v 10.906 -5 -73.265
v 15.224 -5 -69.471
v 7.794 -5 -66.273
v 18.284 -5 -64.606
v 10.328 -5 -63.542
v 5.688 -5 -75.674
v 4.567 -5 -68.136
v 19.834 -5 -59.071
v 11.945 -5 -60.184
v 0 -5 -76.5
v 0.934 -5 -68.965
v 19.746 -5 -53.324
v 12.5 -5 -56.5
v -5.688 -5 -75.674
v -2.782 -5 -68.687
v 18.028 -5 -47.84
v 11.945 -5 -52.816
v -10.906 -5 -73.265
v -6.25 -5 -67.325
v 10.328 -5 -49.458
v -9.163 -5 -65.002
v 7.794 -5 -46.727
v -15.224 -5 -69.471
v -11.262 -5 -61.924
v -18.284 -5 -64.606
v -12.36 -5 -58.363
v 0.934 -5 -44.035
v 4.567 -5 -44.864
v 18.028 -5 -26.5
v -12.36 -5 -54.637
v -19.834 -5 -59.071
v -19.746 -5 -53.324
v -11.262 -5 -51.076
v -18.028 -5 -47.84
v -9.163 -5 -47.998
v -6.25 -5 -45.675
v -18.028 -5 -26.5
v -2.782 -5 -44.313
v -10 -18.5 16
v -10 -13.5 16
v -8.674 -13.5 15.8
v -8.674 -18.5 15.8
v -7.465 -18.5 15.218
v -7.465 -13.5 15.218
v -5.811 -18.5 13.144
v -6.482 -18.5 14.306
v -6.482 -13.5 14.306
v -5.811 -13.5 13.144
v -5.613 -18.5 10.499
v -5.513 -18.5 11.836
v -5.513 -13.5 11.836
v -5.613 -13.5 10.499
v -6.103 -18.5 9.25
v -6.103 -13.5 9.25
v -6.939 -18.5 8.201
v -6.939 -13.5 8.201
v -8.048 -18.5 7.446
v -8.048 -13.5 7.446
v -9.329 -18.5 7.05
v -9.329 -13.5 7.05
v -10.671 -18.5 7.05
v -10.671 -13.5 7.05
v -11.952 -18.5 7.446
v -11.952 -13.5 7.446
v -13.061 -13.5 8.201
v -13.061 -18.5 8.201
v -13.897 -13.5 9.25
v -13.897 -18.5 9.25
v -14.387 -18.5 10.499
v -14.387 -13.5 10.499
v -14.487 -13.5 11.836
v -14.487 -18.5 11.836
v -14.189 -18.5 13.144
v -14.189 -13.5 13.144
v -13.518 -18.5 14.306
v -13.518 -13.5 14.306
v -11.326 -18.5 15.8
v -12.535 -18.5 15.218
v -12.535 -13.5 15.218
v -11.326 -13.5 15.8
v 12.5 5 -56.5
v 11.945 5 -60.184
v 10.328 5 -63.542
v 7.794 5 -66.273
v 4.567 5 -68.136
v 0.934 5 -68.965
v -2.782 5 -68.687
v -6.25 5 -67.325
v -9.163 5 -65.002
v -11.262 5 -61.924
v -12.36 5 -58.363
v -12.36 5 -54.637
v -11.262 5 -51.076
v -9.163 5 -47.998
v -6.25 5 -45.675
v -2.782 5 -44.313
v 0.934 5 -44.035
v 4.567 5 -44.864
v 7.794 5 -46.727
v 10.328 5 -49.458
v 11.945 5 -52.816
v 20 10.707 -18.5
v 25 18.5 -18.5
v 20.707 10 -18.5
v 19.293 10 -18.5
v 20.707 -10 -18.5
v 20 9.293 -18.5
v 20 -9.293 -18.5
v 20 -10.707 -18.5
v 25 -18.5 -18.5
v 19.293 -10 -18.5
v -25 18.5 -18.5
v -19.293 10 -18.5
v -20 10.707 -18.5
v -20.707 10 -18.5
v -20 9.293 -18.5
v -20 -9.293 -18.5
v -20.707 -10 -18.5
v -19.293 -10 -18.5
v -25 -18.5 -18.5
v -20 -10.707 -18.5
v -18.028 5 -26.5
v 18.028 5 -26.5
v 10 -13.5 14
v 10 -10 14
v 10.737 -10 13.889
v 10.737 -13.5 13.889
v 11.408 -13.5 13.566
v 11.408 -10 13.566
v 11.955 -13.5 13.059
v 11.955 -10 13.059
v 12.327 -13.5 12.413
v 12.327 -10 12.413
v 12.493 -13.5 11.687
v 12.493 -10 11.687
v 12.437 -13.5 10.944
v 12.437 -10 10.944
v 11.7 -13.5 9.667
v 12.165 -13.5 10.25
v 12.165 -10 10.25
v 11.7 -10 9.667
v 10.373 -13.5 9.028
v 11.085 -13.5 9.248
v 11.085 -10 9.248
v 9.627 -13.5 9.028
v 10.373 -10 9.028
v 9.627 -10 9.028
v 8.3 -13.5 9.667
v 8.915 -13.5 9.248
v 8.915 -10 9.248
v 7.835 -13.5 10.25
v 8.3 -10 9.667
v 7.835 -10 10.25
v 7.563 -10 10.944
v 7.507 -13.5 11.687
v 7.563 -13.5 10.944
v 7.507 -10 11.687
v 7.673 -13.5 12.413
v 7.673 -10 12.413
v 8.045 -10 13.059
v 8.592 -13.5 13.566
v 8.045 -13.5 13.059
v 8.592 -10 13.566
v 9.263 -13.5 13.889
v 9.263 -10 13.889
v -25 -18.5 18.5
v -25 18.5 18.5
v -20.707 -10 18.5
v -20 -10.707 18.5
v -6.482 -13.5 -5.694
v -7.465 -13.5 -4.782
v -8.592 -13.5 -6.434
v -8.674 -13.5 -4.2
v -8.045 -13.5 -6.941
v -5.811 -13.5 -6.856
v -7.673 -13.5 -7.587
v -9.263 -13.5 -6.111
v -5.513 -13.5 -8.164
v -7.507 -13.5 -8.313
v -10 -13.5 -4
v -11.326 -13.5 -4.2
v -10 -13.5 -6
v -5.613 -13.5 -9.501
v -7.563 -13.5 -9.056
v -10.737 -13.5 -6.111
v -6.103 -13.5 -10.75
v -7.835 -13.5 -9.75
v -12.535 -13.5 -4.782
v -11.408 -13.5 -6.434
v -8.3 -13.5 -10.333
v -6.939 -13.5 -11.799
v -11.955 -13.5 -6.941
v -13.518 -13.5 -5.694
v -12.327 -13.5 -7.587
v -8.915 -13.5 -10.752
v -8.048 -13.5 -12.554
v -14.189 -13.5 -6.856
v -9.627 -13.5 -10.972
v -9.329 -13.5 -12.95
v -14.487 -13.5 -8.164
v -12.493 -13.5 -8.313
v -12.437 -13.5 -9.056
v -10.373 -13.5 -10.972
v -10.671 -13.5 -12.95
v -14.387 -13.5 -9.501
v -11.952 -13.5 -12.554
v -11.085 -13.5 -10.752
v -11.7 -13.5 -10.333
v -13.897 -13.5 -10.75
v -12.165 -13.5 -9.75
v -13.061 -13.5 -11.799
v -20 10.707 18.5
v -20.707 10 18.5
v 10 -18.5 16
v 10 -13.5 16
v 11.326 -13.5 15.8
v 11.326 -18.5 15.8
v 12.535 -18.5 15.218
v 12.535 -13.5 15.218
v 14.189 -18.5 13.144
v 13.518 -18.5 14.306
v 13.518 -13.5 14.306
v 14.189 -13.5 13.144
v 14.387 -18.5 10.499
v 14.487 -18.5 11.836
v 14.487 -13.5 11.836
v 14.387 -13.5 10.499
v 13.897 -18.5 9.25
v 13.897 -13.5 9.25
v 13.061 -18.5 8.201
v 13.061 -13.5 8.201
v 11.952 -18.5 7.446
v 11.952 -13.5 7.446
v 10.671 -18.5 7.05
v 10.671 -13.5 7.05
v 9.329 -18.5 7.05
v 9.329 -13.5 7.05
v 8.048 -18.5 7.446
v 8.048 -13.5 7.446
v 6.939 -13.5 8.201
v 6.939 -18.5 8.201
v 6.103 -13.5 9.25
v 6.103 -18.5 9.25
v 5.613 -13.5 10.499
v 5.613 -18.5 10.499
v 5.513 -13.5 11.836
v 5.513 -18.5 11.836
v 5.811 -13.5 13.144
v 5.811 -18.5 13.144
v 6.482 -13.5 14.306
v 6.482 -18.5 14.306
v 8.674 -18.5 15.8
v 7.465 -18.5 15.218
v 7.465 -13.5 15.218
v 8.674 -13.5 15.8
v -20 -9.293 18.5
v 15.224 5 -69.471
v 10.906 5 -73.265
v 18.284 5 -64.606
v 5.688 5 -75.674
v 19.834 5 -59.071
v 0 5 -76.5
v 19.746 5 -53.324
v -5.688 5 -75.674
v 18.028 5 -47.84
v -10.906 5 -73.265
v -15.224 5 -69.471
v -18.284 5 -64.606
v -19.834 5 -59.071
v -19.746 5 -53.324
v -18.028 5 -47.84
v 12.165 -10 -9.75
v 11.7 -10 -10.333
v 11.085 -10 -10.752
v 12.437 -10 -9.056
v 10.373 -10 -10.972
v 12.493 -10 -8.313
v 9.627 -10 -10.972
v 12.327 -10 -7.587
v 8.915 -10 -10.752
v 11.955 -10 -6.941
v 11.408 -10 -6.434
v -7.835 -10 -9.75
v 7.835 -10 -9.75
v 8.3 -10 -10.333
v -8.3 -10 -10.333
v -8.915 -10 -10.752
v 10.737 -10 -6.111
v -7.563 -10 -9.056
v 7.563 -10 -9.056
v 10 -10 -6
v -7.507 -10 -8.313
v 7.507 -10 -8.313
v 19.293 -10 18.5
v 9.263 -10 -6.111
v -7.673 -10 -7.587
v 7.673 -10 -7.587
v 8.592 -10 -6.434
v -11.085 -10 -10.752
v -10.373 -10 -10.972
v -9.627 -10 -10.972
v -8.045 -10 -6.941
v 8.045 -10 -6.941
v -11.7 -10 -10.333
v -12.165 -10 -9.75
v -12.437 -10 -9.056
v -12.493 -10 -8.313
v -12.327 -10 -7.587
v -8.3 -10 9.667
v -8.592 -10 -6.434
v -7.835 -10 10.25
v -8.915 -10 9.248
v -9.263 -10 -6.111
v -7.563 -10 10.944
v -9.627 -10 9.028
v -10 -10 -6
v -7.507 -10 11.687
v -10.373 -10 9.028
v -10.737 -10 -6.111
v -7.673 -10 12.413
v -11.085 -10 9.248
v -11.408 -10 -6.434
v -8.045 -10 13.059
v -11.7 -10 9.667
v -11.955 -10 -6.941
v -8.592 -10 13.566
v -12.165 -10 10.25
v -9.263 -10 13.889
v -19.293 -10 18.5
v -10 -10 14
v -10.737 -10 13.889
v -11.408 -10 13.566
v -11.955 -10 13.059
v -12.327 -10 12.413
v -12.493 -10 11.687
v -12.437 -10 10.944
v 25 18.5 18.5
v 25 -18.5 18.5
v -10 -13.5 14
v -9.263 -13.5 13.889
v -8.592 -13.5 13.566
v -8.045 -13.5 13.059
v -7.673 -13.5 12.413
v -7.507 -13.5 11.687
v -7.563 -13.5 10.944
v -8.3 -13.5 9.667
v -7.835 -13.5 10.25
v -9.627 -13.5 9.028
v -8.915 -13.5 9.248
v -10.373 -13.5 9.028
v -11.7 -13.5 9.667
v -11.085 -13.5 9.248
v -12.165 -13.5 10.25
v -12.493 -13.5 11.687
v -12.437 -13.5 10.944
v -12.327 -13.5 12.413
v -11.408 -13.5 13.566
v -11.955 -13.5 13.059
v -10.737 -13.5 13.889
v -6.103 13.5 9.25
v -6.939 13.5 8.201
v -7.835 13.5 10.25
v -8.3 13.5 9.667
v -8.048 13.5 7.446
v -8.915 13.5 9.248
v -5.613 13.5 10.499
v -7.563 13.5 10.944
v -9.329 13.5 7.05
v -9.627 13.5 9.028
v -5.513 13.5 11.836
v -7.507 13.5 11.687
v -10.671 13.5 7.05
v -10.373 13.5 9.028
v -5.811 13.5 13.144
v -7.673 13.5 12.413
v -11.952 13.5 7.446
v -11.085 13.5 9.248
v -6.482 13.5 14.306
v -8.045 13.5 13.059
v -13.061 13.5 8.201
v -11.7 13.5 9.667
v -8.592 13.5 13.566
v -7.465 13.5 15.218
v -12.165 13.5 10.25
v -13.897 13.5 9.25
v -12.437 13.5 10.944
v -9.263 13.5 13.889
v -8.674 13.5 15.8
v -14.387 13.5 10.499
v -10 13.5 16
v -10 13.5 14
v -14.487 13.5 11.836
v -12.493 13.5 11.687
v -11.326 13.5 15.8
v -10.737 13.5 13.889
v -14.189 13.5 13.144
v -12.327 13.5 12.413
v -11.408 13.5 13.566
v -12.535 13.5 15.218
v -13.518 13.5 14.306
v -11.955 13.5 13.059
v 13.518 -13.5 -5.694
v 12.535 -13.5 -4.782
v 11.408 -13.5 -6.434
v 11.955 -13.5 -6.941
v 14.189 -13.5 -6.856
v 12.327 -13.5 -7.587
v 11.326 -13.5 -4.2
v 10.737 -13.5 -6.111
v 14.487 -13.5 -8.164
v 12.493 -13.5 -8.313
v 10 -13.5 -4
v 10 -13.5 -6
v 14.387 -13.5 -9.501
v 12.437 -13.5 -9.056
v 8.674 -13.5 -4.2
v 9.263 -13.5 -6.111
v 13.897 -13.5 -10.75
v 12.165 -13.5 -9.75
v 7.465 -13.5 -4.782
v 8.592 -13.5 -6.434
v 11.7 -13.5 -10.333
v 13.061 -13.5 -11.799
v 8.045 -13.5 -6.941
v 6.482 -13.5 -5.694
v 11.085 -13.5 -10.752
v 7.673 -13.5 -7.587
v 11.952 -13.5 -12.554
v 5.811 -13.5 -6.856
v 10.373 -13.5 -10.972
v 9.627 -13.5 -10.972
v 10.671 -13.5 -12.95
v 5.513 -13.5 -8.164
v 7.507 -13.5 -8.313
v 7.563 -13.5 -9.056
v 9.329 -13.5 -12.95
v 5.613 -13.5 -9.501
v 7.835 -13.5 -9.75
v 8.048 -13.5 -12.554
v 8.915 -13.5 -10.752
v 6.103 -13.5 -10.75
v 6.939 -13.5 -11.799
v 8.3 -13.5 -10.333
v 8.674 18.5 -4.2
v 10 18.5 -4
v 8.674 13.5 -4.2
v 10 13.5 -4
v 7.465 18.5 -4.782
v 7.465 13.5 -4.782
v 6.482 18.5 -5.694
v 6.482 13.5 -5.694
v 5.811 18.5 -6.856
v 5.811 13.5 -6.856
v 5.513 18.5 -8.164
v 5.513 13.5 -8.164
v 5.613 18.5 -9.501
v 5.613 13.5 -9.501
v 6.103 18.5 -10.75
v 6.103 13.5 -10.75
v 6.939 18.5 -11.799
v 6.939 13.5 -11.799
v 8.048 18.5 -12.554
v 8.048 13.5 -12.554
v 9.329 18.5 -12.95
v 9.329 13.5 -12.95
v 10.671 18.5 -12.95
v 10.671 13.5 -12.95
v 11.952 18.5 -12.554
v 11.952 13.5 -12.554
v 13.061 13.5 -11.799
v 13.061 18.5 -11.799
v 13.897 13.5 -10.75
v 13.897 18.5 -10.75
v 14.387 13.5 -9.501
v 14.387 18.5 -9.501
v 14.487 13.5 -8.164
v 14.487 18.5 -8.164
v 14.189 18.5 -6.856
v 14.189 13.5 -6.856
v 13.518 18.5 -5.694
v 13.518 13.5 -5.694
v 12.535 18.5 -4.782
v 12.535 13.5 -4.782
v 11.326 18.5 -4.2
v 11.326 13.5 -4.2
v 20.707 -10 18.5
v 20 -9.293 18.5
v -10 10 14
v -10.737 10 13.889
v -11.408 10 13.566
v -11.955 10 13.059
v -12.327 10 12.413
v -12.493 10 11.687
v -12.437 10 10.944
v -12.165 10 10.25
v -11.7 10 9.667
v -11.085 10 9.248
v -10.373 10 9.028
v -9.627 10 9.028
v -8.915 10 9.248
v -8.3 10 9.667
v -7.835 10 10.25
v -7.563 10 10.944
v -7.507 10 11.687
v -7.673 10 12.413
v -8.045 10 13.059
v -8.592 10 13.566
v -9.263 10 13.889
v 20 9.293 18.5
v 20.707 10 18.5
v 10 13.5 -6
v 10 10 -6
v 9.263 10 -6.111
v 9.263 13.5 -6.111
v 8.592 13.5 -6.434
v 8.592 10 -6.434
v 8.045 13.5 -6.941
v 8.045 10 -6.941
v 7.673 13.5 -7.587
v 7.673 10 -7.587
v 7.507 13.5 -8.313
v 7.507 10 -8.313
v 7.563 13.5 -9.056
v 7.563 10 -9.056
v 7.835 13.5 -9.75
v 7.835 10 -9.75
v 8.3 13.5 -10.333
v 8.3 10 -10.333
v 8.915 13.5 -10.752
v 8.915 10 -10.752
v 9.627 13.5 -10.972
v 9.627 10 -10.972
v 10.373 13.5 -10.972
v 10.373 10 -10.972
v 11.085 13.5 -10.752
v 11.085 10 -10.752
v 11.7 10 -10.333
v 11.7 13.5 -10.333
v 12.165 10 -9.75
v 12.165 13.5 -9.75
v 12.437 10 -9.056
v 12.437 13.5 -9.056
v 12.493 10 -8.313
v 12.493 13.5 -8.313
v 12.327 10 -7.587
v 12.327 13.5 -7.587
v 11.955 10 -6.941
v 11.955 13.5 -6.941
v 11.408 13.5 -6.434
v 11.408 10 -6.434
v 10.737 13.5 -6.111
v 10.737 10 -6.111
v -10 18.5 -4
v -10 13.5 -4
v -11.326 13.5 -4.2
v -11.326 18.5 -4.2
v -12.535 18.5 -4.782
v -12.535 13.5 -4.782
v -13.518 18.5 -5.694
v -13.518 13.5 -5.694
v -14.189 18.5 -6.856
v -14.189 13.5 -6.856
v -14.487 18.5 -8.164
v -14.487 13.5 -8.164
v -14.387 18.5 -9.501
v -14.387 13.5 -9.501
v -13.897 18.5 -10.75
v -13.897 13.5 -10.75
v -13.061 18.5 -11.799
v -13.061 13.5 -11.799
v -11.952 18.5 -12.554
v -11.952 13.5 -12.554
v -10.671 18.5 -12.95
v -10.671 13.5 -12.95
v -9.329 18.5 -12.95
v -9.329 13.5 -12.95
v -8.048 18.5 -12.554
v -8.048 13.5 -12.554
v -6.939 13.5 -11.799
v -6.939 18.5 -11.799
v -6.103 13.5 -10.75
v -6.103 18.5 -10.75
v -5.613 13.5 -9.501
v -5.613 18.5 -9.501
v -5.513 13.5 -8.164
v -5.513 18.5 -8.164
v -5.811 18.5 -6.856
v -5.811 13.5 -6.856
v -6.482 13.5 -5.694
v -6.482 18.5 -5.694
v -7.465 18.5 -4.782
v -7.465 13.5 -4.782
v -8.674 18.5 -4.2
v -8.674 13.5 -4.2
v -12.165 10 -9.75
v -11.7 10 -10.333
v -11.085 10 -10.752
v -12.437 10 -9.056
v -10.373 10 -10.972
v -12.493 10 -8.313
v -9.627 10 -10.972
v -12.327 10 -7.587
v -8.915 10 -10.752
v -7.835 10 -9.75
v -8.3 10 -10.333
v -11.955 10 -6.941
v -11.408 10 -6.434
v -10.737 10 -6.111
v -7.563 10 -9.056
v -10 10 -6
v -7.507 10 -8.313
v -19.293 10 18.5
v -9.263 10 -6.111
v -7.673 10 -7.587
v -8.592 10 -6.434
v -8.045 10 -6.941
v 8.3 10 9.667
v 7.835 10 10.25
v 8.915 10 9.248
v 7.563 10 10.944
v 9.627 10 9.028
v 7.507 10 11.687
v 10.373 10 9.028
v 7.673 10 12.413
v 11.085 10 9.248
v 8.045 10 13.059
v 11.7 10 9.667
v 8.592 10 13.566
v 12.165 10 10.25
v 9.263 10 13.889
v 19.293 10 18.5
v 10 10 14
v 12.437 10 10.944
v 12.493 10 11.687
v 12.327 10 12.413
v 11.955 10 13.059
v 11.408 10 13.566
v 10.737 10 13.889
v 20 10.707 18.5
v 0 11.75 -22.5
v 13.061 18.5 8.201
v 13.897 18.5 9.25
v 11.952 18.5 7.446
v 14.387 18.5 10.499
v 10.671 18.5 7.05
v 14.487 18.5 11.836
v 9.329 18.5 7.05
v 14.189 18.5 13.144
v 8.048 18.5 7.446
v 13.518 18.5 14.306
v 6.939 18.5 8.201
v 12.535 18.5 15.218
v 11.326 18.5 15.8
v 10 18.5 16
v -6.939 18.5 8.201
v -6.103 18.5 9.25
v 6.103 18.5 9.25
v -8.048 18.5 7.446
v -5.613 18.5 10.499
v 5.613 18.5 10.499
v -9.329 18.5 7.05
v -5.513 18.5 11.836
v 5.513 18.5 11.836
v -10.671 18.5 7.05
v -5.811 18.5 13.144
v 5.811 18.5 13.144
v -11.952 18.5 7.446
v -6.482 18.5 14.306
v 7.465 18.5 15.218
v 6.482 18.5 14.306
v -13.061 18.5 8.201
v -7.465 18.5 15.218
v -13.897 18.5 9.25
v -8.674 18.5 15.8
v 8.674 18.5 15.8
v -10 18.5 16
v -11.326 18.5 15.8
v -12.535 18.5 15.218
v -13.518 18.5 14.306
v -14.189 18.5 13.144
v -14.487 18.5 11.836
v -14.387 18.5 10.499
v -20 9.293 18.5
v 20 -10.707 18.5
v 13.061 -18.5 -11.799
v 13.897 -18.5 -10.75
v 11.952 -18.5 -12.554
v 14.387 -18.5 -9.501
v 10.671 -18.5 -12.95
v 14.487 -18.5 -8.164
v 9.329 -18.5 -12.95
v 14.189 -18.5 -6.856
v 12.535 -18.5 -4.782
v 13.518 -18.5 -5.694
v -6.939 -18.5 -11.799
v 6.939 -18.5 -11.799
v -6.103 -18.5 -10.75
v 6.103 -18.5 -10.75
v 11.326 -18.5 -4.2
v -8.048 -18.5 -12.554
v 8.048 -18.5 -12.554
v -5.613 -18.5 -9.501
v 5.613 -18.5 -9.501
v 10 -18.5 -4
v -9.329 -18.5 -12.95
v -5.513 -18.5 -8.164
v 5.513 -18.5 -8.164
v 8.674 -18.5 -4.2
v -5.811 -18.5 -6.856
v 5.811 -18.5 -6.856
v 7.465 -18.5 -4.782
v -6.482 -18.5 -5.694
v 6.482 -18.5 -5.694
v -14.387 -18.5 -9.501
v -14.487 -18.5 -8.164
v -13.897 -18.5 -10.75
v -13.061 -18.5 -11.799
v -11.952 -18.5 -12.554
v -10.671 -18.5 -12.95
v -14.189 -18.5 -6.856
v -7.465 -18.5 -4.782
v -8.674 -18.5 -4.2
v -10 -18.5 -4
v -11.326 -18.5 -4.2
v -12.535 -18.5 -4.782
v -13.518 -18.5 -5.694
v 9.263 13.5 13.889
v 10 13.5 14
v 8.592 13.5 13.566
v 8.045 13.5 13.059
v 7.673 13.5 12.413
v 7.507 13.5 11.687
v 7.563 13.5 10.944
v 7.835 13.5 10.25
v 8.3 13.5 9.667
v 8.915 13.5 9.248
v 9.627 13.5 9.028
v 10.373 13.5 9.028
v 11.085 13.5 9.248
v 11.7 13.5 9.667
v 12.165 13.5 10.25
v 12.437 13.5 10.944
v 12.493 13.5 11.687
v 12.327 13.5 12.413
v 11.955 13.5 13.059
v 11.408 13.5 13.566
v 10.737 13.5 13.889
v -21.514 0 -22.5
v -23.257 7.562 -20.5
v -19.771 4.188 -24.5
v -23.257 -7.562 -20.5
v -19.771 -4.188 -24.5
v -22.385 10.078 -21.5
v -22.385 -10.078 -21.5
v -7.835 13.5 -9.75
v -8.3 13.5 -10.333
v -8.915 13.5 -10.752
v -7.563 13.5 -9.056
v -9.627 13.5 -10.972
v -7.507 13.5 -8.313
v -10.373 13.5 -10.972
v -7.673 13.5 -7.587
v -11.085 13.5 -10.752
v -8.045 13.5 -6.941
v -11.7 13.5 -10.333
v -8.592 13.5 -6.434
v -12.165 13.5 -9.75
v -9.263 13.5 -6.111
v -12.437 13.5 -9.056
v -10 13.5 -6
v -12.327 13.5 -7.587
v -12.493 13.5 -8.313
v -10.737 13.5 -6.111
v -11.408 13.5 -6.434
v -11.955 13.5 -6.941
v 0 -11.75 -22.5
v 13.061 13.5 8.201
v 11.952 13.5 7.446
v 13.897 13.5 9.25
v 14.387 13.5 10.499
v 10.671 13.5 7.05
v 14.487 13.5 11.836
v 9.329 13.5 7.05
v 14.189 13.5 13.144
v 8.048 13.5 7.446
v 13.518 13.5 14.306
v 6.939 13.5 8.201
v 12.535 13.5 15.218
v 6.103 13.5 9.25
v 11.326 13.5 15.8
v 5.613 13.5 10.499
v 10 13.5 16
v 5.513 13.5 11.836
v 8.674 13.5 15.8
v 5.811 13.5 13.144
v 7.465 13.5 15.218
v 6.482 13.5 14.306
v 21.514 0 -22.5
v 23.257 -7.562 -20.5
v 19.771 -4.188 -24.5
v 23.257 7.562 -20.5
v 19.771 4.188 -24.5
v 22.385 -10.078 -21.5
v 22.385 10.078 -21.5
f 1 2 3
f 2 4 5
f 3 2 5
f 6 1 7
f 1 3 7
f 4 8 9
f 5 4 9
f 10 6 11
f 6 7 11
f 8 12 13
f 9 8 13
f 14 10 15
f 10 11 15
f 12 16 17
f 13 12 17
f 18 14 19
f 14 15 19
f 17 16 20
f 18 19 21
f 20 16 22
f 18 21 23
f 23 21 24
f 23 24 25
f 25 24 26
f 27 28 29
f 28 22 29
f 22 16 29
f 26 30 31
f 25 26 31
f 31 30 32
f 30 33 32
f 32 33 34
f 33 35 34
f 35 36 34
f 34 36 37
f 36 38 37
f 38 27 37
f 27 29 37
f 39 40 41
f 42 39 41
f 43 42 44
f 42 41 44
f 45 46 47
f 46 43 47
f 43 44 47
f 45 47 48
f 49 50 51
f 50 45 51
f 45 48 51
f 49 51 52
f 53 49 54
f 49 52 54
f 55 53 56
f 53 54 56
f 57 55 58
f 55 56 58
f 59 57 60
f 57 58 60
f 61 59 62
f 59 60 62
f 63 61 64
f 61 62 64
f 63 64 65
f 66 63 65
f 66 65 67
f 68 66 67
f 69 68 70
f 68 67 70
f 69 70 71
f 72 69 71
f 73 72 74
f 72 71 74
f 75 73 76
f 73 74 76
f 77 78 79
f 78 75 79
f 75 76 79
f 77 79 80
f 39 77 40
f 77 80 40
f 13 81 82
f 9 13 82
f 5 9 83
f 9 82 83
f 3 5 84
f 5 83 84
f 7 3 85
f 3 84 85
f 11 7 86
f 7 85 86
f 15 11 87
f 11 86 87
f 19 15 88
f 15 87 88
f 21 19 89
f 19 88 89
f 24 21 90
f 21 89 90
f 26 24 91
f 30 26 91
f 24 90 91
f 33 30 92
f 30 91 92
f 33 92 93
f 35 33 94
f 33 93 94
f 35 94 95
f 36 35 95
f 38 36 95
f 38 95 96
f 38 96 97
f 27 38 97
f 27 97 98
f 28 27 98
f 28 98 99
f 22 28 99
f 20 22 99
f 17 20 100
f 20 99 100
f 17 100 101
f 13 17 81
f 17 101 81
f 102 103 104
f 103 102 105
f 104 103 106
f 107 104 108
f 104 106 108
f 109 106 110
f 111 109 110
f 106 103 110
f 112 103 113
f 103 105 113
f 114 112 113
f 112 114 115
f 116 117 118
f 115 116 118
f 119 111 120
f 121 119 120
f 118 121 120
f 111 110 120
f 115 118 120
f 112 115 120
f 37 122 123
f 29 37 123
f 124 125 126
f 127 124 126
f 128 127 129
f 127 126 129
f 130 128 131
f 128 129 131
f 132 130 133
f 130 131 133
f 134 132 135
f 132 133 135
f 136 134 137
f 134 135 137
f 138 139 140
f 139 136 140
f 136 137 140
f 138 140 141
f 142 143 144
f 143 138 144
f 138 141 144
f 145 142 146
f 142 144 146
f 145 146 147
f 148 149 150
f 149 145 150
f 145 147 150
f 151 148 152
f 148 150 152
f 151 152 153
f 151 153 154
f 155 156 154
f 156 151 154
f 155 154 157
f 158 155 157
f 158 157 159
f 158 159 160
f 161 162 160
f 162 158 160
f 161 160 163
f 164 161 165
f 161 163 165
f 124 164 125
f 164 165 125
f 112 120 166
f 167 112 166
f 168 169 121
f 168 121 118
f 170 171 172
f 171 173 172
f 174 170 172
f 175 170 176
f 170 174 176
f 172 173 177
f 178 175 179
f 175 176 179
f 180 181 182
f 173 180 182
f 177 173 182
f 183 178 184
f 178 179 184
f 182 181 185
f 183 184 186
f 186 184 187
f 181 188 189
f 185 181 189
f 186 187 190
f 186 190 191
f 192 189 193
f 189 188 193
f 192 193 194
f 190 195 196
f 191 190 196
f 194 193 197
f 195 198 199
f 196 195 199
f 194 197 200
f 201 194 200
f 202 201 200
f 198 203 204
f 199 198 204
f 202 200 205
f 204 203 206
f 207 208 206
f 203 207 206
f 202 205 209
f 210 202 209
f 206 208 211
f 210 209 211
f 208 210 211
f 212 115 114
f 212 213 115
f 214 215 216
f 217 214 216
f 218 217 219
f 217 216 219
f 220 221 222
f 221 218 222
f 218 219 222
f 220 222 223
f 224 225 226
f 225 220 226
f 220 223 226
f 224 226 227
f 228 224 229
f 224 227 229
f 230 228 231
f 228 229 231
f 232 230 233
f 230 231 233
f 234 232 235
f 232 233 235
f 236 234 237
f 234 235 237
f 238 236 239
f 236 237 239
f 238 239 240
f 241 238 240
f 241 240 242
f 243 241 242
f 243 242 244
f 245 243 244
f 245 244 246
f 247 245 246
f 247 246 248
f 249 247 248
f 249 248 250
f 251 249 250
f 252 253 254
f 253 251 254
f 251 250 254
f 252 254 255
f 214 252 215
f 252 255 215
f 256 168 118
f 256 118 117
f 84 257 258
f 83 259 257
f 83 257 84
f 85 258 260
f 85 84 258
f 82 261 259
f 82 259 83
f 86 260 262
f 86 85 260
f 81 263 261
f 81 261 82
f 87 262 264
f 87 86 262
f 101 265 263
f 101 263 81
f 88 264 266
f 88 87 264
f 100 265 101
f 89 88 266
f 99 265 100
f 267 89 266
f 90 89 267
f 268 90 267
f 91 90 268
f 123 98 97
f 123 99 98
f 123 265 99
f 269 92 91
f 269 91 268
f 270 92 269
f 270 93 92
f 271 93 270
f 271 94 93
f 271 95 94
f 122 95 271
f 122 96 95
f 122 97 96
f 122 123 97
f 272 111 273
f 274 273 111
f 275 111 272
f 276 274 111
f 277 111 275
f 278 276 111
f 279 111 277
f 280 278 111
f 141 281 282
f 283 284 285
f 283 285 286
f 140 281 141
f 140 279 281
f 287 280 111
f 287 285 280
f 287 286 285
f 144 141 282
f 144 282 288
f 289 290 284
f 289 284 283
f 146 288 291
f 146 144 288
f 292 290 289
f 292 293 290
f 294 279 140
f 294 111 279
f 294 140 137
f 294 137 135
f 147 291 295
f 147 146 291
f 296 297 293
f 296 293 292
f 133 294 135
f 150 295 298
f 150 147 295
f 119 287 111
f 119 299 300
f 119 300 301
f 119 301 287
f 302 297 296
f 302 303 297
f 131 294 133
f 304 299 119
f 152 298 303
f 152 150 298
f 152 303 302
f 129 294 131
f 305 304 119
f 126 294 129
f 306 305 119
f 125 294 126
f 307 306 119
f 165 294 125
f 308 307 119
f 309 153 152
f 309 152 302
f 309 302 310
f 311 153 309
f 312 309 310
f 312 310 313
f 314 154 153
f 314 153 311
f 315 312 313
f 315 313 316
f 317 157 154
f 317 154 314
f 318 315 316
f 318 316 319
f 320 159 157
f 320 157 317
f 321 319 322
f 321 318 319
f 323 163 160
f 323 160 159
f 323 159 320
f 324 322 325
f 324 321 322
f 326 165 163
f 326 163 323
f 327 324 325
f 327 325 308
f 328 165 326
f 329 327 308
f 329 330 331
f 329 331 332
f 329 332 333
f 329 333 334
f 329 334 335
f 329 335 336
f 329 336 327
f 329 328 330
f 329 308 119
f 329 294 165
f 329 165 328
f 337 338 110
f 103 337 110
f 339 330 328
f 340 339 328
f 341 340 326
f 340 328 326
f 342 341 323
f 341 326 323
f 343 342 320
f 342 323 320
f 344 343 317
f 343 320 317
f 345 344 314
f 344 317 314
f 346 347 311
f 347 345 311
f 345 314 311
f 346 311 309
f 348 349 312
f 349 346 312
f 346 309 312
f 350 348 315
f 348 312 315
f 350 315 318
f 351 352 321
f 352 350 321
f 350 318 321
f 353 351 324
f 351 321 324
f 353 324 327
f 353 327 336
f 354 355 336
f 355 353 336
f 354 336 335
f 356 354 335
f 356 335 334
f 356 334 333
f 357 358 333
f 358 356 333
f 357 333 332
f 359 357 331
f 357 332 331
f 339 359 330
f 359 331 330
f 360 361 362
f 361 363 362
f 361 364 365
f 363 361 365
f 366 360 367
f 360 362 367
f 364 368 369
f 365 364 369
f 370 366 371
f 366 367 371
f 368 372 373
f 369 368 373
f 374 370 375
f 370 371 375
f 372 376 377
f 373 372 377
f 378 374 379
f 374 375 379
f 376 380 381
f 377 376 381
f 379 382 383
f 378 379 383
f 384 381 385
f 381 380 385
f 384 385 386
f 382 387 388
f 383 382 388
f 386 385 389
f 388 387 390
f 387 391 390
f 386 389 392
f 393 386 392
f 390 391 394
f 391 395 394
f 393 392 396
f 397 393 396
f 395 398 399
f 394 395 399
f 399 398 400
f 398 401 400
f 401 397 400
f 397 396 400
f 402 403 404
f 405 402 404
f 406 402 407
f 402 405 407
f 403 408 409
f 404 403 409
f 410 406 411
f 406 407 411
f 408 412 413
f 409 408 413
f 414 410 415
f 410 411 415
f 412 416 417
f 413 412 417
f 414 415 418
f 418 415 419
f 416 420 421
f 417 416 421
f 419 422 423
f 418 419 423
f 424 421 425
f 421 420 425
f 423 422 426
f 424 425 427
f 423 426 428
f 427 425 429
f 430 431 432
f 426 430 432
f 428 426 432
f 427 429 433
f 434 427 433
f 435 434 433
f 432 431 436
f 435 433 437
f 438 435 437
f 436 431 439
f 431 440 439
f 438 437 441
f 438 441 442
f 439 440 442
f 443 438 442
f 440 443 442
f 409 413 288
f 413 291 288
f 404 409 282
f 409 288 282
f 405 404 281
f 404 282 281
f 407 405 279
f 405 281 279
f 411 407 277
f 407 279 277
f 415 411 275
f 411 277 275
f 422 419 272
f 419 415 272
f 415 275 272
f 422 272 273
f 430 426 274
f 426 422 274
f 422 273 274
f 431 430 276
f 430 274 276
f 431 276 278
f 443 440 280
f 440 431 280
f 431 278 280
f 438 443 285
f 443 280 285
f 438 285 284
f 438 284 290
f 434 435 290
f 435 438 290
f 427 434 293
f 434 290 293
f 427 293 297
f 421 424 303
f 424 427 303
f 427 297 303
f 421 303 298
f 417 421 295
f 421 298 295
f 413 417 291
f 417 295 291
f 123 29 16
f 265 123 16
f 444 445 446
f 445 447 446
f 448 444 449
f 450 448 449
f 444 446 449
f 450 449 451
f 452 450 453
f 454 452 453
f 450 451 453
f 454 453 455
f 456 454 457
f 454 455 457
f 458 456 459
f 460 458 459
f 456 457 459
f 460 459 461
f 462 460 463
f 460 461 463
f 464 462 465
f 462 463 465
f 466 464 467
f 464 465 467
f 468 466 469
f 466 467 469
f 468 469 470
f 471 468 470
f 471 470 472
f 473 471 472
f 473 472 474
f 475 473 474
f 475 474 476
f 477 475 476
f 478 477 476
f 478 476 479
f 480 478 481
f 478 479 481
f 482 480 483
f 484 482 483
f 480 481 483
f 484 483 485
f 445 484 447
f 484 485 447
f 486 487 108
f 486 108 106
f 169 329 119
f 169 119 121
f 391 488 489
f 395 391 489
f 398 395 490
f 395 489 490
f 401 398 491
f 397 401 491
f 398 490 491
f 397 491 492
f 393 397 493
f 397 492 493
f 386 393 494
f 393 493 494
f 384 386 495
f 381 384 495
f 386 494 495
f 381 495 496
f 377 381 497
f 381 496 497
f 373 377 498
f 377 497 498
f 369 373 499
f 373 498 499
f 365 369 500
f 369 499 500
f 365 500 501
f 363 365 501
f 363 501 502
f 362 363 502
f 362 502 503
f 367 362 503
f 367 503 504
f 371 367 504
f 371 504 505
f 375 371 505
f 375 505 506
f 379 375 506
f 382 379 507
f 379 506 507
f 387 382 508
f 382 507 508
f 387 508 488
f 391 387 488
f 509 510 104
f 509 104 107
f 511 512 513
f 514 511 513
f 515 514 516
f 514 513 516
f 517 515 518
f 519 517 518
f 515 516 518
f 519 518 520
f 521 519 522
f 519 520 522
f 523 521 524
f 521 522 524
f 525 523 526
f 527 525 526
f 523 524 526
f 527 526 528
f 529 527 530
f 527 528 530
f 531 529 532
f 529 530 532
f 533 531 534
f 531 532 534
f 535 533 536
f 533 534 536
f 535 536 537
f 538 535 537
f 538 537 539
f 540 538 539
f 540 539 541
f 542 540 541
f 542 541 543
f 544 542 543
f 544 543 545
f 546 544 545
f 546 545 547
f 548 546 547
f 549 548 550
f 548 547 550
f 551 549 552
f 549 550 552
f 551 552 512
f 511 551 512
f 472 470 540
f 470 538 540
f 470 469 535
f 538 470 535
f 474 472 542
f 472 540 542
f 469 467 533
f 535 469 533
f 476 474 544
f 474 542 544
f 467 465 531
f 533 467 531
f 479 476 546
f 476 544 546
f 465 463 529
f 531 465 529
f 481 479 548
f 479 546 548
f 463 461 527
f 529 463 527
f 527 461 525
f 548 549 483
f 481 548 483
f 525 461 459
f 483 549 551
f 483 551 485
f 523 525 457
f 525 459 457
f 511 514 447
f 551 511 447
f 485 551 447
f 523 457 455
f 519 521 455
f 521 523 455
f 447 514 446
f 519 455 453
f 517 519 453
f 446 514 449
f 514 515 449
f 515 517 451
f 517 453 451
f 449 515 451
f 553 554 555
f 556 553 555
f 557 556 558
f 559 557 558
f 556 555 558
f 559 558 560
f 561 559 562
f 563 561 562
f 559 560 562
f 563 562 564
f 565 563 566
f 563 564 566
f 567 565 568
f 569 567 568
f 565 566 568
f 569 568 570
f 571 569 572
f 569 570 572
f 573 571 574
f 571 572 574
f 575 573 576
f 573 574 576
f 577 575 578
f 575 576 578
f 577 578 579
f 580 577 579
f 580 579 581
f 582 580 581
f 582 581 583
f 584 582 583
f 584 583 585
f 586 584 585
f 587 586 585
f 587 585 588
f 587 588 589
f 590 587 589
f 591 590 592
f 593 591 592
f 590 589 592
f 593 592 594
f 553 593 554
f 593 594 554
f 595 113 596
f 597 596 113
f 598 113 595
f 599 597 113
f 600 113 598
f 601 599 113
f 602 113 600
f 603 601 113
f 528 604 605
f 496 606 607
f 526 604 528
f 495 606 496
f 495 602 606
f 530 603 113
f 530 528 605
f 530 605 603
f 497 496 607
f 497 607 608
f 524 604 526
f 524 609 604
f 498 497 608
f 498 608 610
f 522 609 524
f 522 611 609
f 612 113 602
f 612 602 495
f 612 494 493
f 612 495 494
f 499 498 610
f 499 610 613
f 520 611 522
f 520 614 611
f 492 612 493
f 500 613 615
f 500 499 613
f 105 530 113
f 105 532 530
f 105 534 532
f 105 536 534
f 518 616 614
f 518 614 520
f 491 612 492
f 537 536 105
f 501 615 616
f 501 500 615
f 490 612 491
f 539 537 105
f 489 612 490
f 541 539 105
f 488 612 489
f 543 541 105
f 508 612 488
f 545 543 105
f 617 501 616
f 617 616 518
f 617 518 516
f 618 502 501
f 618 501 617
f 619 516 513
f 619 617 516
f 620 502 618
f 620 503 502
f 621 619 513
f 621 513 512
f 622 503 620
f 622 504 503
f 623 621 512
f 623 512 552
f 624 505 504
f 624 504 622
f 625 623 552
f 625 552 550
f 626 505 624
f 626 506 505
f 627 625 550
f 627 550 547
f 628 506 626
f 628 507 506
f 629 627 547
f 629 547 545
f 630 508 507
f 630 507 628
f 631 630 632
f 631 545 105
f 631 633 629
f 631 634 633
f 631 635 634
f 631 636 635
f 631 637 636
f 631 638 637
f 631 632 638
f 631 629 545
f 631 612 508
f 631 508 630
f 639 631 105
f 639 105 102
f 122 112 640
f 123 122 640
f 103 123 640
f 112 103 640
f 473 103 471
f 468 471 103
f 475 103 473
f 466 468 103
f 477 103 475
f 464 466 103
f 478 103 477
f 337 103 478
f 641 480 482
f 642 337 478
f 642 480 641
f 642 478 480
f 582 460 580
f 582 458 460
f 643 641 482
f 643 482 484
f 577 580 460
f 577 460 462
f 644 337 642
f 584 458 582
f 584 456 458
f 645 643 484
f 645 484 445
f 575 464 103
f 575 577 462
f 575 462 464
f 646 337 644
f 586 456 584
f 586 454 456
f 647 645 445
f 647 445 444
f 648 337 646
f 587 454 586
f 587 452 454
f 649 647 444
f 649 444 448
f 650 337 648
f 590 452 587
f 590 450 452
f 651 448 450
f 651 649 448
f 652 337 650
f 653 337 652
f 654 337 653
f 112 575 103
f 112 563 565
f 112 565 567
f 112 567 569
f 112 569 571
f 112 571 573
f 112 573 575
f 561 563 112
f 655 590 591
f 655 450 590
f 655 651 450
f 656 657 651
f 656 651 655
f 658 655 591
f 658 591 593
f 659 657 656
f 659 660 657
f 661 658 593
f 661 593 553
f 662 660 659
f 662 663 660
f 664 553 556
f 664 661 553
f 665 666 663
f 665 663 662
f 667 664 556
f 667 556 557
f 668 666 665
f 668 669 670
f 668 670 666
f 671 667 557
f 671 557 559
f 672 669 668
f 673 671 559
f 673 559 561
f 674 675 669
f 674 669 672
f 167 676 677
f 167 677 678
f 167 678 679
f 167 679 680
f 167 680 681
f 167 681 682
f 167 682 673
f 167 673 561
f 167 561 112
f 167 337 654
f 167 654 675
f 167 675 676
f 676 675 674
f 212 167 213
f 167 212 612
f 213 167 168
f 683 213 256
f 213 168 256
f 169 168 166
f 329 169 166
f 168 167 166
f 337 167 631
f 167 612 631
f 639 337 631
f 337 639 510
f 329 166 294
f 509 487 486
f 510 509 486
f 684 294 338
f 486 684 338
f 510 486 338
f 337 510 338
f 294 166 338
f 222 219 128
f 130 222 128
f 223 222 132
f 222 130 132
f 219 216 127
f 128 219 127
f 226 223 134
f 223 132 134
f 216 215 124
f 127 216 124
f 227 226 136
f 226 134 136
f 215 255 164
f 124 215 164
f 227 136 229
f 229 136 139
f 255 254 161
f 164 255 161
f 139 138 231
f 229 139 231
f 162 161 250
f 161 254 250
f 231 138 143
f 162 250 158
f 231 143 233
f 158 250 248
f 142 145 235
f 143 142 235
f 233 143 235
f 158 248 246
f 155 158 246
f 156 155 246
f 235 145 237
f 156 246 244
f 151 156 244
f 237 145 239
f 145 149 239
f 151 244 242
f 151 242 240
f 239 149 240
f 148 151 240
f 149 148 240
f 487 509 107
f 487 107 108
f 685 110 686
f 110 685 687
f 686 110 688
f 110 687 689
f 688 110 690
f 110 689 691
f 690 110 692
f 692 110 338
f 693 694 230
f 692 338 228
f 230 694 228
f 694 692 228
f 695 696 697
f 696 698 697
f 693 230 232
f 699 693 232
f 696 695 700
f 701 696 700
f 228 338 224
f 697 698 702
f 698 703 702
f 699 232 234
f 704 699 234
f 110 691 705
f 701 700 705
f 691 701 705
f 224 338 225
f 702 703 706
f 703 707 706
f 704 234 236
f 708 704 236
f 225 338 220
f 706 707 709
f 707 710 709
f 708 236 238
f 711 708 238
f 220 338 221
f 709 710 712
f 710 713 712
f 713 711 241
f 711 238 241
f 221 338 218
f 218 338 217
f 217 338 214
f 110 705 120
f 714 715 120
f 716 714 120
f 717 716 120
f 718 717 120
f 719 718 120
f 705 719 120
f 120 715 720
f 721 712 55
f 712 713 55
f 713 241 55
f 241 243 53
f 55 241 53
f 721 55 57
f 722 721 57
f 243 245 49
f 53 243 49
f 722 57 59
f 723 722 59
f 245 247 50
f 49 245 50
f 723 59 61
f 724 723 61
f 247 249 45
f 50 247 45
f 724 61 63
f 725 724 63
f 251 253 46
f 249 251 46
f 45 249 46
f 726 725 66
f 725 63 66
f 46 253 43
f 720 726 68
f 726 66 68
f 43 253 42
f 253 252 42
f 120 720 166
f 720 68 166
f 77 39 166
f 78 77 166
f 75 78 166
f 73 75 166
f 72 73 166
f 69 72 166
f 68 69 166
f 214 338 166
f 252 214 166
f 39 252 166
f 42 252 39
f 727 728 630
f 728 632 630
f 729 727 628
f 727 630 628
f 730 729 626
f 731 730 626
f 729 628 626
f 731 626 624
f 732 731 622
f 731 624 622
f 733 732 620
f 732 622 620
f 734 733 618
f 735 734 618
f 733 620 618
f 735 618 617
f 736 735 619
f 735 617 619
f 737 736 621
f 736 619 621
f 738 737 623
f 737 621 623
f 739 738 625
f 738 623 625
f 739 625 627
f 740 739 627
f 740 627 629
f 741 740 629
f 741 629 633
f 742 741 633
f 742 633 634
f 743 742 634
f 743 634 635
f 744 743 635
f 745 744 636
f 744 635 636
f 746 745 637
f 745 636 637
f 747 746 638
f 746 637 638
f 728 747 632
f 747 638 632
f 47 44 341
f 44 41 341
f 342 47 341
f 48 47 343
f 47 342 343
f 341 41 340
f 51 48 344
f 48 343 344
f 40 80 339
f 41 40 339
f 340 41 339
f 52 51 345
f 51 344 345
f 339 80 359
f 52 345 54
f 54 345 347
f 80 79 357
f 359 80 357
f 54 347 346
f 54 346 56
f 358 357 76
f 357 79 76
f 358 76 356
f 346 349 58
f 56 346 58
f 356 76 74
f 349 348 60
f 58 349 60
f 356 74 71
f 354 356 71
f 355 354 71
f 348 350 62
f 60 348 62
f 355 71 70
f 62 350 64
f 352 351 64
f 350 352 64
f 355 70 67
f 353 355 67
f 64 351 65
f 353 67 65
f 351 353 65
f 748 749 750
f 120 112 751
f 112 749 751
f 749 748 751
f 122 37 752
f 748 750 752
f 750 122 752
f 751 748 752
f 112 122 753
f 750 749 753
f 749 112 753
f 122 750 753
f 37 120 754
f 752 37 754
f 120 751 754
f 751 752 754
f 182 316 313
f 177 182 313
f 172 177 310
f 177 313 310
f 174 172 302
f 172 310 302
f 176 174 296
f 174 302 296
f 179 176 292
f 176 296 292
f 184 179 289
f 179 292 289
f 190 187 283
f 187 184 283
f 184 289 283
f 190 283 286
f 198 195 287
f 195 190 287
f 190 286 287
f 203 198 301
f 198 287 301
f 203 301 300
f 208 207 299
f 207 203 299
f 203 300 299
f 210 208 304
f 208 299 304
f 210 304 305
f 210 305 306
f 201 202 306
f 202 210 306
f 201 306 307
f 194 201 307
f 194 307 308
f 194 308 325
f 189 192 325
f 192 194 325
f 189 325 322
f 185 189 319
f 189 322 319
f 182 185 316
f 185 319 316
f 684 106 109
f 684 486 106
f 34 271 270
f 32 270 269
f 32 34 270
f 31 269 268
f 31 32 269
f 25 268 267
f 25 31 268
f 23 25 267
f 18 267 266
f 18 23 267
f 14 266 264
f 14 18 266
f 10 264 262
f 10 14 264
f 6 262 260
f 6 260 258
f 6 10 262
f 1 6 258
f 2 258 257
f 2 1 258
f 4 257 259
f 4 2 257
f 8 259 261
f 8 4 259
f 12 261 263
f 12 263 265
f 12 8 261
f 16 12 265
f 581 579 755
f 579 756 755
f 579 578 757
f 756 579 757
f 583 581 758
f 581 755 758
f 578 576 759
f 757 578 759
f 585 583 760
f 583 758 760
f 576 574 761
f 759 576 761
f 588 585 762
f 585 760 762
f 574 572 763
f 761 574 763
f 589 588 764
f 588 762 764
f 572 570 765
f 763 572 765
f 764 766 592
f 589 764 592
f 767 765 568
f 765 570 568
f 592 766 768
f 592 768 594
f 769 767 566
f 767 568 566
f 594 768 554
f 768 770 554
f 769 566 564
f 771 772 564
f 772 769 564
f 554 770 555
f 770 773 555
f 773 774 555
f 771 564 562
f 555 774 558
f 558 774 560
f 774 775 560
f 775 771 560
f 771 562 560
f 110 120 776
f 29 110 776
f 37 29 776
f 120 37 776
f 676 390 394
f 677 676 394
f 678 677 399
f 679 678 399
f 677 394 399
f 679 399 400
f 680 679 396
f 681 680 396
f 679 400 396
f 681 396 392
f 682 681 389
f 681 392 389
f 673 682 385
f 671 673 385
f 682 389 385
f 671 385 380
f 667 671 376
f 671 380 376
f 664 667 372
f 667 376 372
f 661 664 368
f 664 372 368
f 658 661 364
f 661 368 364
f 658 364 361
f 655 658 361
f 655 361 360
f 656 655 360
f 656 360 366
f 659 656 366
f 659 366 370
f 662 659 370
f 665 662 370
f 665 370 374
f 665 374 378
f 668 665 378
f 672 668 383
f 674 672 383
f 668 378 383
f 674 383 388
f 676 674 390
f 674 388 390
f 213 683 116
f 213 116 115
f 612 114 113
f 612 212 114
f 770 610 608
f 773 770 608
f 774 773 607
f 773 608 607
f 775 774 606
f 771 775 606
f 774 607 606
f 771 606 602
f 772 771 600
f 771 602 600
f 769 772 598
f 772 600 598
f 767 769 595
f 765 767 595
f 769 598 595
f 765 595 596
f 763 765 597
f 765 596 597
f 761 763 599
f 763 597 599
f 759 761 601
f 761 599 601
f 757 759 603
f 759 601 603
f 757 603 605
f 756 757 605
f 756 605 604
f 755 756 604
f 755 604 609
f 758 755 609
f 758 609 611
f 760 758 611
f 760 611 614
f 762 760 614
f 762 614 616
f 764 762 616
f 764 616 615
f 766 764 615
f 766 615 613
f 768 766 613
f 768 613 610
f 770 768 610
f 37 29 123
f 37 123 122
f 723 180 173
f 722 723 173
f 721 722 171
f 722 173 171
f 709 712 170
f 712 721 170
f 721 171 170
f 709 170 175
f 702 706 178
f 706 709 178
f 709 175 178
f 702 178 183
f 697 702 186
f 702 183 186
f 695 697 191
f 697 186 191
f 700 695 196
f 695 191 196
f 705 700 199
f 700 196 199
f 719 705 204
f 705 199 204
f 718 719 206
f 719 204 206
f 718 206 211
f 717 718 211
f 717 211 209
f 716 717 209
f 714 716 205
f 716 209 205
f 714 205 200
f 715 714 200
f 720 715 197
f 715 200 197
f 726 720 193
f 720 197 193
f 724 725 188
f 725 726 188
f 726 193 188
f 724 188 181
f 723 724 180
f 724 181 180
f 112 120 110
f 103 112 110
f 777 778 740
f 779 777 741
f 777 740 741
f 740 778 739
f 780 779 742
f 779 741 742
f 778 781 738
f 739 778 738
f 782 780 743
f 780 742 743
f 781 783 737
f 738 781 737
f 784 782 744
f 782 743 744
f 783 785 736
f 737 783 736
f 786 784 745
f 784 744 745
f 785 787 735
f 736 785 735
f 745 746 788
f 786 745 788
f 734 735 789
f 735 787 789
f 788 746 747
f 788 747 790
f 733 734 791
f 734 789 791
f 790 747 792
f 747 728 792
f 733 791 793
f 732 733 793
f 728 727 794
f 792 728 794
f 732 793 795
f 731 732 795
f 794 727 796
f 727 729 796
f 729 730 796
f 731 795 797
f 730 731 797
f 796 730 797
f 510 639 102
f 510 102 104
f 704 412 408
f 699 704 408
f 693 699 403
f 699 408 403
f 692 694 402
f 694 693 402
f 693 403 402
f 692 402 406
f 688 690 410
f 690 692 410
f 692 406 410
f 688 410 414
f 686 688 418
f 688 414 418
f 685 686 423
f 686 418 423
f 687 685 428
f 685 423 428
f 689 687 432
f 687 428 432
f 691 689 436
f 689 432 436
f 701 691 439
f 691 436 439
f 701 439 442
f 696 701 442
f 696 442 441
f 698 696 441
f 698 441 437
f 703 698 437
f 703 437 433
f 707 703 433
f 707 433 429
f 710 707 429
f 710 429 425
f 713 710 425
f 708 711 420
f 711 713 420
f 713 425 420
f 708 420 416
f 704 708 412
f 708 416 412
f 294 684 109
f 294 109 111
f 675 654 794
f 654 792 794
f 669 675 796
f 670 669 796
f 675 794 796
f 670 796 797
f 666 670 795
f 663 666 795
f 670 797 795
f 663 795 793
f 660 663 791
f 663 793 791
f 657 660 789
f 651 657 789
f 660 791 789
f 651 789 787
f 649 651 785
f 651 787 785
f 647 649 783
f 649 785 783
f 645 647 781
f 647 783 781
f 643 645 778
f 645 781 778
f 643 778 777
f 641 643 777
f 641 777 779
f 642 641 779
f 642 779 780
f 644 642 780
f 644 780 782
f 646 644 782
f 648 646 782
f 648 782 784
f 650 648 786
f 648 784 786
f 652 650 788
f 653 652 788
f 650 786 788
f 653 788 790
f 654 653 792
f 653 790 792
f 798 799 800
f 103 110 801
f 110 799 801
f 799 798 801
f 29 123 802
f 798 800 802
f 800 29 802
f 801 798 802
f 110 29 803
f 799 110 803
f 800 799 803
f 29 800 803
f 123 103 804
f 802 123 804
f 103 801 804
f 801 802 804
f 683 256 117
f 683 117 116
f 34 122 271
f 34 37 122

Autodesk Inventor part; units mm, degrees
ref_plane "YZ Plane" through (0, 0, 0) normal (1, 0, 0) x (0, 1, 0)
ref_plane "XZ Plane" through (0, 0, 0) normal (0, 1, 0) x (-1, 0, 0)
ref_plane "XY Plane" through (0, 0, 0) normal (0, 0, 1) x (1, 0, 0)
sketch "Sketch1" plane through (0, 0, 0) normal (0, 1, 0) x (-1, 0, 0)
  line L0 (25, 18.5) -> (-25, 18.5)
  line L1 (-25, 18.5) -> (-25, -18.5)
  line L2 (-25, -18.5) -> (25, -18.5)
  line L3 (25, -18.5) -> (25, 18.5)
  line L4 (25, 18.5) -> (-25, -18.5) construction
  line L5 (-25, 18.5) -> (25, -18.5) construction
  point P0 (0, 0)
  dimension "d0" = 50
  dimension "d1" = 37
extrude "Extrusion1" add sketch "Sketch1" along normal mid plane 37
sketch "Sketch2" plane through (-25, 18.5, 18.5) normal (0, 0, 1) x (1, 0, 0)
  line L0 (5, -8.5) -> (45, -8.5)
  line L1 (45, -8.5) -> (45, -28.5)
  line L2 (45, -28.5) -> (5, -28.5)
  line L3 (5, -28.5) -> (5, -8.5)
  line L4 (5, -8.5) -> (45, -28.5) construction
  line L5 (45, -8.5) -> (5, -28.5) construction
  line L6 (5, -7.7929) -> (5.7071, -8.5)
  line L7 (5.7071, -8.5) -> (5, -9.2071)
  line L8 (5, -9.2071) -> (4.2929, -8.5)
  line L9 (4.2929, -8.5) -> (5, -7.7929)
  line L10 (4.5, -8) -> (5.5, -9) construction
  line L11 (5.5, -8) -> (4.5, -9) construction
  line L12 (45, -7.7929) -> (45.7071, -8.5)
  line L13 (45.7071, -8.5) -> (45, -9.2071)
  line L14 (45, -9.2071) -> (44.2929, -8.5)
  line L15 (44.2929, -8.5) -> (45, -7.7929)
  line L16 (45, -27.7929) -> (45.7071, -28.5)
  line L17 (45.7071, -28.5) -> (45, -29.2071)
  line L18 (45, -29.2071) -> (44.2929, -28.5)
  line L19 (44.2929, -28.5) -> (45, -27.7929)
  line L20 (5, -27.7929) -> (5.7071, -28.5)
  line L21 (5.7071, -28.5) -> (5, -29.2071)
  line L22 (5, -29.2071) -> (4.2929, -28.5)
  line L23 (4.2929, -28.5) -> (5, -27.7929)
  point P0 (25, -18.5)
  point P1 (5, -9.2071)
  point P2 (5, -27.7929)
  point P3 (5.7071, -28.5)
  point P4 (5.7071, -8.5)
  dimension "d4" = 40
  dimension "d5" = 20
  dimension "d6" = 1
  dimension "d7" = 1
  dimension "d8" = 1
  dimension "d9" = 1
  dimension "d10" = 1
  dimension "d11" = 1
  dimension "d12" = 1
  dimension "d13" = 1
extrude "Extrusion2" cut sketch "Sketch2" against normal blind 37
sketch "Sketch3" plane through (0, 18.5, 0) normal (0, 1, 0) x (1, 0, 0)
  line L0 (25, -18.5) -> (-25, -18.5) construction
  line L1 (0, -18.5) -> (0, -1.5) construction
  line L2 (-10, 8.5) -> (10, 8.5) construction
  line L3 (10, 8.5) -> (10, -11.5) construction
  line L4 (10, -11.5) -> (-10, -11.5) construction
  line L5 (-10, -11.5) -> (-10, 8.5) construction
  line L6 (-10, 8.5) -> (10, -11.5) construction
  line L7 (10, 8.5) -> (-10, -11.5) construction
  point P0 (0, 0)
  dimension "d16" = 17
  dimension "d17" = 20
  dimension "d18" = 20
hole "Hole1" at (-10, 18.5, 11.5) at (-10, 18.5, -8.5) at (10, 18.5, -8.5) at (10, 18.5, 11.5) direction (0, -1, 0) diameter 5 depth 8.5 counterbore diameter 9 counterbore depth 5
mirror "Mirror1" about plane through (0, 0, 0) normal (0, 1, 0) of "Hole1"
sketch "Sketch4" plane through (0, 0, 0) normal (0, 1, 0) x (-1, 0, 0)
  line L0 (19.2929, -18.5) -> (-19.2929, -18.5) projected
  line L1 (0, -18.5) -> (0, -56.5) construction
  line L2 (-25, -18.5) -> (25, -18.5) projected
  line L3 (25, 18.5) -> (25, -18.5) construction
  line L4 (0, -94.5) -> (0, -18.5) construction
  circle A0 centre (0, -56.5) radius 35
  line L5 (0, -21.5) -> (0, -26.5)
  line L6 (0, -26.5) -> (-18.0278, -26.5)
  line L7 (0, -26.5) -> (18.0278, -26.5)
  line L8 (-18.0278, -26.5) -> (-18.0278, -86.5)
  line L9 (18.0278, -26.5) -> (18.0278, -86.5)
  circle A1 centre (0, -56.5) radius 20
  point P0 (0, 0)
  point P1 (18.0278, -47.8397)
  point P2 (-18.0278, -47.8397)
  point P3 (-18.0278, -65.1603)
  point P4 (18.0278, -65.1603)
  dimension "d26" = 38
  dimension "d35" = 70
  dimension "d36" = 5
  dimension "d46" = 40
extrude "Extrusion5" add sketch "Sketch4" along normal mid plane 10 contours L9 A1 L8 L6 L7 | A1 L9 | L9 A1 L8 | L8 A1
loft "Loft1" add separate body section 1 edges at (-25, 0, -18.5) (0, 18.5, -18.5) (25, 0, -18.5) (0, -18.5, -18.5) section 2 edges at (18.0278, 0, -26.5) (0, 5, -26.5) (-18.0278, 0, -26.5) (0, -5, -26.5)
sketch "Sketch6" plane through (0, 5, 0) normal (0, 1, 0) x (1, 0, 0)
  arc A0 (18.0278, 26.5) -> (-18.0278, 26.5) centre (0, 56.5) ccw projected
  circle A1 centre (0, 56.5) radius 12.5
  point P0 (0, 0)
  dimension "d43" = 25
extrude "Extrusion6" cut sketch "Sketch6" against normal blind 10 bodies 1
properties part number "EndEffectorJoint" material "ABS Plastic"
